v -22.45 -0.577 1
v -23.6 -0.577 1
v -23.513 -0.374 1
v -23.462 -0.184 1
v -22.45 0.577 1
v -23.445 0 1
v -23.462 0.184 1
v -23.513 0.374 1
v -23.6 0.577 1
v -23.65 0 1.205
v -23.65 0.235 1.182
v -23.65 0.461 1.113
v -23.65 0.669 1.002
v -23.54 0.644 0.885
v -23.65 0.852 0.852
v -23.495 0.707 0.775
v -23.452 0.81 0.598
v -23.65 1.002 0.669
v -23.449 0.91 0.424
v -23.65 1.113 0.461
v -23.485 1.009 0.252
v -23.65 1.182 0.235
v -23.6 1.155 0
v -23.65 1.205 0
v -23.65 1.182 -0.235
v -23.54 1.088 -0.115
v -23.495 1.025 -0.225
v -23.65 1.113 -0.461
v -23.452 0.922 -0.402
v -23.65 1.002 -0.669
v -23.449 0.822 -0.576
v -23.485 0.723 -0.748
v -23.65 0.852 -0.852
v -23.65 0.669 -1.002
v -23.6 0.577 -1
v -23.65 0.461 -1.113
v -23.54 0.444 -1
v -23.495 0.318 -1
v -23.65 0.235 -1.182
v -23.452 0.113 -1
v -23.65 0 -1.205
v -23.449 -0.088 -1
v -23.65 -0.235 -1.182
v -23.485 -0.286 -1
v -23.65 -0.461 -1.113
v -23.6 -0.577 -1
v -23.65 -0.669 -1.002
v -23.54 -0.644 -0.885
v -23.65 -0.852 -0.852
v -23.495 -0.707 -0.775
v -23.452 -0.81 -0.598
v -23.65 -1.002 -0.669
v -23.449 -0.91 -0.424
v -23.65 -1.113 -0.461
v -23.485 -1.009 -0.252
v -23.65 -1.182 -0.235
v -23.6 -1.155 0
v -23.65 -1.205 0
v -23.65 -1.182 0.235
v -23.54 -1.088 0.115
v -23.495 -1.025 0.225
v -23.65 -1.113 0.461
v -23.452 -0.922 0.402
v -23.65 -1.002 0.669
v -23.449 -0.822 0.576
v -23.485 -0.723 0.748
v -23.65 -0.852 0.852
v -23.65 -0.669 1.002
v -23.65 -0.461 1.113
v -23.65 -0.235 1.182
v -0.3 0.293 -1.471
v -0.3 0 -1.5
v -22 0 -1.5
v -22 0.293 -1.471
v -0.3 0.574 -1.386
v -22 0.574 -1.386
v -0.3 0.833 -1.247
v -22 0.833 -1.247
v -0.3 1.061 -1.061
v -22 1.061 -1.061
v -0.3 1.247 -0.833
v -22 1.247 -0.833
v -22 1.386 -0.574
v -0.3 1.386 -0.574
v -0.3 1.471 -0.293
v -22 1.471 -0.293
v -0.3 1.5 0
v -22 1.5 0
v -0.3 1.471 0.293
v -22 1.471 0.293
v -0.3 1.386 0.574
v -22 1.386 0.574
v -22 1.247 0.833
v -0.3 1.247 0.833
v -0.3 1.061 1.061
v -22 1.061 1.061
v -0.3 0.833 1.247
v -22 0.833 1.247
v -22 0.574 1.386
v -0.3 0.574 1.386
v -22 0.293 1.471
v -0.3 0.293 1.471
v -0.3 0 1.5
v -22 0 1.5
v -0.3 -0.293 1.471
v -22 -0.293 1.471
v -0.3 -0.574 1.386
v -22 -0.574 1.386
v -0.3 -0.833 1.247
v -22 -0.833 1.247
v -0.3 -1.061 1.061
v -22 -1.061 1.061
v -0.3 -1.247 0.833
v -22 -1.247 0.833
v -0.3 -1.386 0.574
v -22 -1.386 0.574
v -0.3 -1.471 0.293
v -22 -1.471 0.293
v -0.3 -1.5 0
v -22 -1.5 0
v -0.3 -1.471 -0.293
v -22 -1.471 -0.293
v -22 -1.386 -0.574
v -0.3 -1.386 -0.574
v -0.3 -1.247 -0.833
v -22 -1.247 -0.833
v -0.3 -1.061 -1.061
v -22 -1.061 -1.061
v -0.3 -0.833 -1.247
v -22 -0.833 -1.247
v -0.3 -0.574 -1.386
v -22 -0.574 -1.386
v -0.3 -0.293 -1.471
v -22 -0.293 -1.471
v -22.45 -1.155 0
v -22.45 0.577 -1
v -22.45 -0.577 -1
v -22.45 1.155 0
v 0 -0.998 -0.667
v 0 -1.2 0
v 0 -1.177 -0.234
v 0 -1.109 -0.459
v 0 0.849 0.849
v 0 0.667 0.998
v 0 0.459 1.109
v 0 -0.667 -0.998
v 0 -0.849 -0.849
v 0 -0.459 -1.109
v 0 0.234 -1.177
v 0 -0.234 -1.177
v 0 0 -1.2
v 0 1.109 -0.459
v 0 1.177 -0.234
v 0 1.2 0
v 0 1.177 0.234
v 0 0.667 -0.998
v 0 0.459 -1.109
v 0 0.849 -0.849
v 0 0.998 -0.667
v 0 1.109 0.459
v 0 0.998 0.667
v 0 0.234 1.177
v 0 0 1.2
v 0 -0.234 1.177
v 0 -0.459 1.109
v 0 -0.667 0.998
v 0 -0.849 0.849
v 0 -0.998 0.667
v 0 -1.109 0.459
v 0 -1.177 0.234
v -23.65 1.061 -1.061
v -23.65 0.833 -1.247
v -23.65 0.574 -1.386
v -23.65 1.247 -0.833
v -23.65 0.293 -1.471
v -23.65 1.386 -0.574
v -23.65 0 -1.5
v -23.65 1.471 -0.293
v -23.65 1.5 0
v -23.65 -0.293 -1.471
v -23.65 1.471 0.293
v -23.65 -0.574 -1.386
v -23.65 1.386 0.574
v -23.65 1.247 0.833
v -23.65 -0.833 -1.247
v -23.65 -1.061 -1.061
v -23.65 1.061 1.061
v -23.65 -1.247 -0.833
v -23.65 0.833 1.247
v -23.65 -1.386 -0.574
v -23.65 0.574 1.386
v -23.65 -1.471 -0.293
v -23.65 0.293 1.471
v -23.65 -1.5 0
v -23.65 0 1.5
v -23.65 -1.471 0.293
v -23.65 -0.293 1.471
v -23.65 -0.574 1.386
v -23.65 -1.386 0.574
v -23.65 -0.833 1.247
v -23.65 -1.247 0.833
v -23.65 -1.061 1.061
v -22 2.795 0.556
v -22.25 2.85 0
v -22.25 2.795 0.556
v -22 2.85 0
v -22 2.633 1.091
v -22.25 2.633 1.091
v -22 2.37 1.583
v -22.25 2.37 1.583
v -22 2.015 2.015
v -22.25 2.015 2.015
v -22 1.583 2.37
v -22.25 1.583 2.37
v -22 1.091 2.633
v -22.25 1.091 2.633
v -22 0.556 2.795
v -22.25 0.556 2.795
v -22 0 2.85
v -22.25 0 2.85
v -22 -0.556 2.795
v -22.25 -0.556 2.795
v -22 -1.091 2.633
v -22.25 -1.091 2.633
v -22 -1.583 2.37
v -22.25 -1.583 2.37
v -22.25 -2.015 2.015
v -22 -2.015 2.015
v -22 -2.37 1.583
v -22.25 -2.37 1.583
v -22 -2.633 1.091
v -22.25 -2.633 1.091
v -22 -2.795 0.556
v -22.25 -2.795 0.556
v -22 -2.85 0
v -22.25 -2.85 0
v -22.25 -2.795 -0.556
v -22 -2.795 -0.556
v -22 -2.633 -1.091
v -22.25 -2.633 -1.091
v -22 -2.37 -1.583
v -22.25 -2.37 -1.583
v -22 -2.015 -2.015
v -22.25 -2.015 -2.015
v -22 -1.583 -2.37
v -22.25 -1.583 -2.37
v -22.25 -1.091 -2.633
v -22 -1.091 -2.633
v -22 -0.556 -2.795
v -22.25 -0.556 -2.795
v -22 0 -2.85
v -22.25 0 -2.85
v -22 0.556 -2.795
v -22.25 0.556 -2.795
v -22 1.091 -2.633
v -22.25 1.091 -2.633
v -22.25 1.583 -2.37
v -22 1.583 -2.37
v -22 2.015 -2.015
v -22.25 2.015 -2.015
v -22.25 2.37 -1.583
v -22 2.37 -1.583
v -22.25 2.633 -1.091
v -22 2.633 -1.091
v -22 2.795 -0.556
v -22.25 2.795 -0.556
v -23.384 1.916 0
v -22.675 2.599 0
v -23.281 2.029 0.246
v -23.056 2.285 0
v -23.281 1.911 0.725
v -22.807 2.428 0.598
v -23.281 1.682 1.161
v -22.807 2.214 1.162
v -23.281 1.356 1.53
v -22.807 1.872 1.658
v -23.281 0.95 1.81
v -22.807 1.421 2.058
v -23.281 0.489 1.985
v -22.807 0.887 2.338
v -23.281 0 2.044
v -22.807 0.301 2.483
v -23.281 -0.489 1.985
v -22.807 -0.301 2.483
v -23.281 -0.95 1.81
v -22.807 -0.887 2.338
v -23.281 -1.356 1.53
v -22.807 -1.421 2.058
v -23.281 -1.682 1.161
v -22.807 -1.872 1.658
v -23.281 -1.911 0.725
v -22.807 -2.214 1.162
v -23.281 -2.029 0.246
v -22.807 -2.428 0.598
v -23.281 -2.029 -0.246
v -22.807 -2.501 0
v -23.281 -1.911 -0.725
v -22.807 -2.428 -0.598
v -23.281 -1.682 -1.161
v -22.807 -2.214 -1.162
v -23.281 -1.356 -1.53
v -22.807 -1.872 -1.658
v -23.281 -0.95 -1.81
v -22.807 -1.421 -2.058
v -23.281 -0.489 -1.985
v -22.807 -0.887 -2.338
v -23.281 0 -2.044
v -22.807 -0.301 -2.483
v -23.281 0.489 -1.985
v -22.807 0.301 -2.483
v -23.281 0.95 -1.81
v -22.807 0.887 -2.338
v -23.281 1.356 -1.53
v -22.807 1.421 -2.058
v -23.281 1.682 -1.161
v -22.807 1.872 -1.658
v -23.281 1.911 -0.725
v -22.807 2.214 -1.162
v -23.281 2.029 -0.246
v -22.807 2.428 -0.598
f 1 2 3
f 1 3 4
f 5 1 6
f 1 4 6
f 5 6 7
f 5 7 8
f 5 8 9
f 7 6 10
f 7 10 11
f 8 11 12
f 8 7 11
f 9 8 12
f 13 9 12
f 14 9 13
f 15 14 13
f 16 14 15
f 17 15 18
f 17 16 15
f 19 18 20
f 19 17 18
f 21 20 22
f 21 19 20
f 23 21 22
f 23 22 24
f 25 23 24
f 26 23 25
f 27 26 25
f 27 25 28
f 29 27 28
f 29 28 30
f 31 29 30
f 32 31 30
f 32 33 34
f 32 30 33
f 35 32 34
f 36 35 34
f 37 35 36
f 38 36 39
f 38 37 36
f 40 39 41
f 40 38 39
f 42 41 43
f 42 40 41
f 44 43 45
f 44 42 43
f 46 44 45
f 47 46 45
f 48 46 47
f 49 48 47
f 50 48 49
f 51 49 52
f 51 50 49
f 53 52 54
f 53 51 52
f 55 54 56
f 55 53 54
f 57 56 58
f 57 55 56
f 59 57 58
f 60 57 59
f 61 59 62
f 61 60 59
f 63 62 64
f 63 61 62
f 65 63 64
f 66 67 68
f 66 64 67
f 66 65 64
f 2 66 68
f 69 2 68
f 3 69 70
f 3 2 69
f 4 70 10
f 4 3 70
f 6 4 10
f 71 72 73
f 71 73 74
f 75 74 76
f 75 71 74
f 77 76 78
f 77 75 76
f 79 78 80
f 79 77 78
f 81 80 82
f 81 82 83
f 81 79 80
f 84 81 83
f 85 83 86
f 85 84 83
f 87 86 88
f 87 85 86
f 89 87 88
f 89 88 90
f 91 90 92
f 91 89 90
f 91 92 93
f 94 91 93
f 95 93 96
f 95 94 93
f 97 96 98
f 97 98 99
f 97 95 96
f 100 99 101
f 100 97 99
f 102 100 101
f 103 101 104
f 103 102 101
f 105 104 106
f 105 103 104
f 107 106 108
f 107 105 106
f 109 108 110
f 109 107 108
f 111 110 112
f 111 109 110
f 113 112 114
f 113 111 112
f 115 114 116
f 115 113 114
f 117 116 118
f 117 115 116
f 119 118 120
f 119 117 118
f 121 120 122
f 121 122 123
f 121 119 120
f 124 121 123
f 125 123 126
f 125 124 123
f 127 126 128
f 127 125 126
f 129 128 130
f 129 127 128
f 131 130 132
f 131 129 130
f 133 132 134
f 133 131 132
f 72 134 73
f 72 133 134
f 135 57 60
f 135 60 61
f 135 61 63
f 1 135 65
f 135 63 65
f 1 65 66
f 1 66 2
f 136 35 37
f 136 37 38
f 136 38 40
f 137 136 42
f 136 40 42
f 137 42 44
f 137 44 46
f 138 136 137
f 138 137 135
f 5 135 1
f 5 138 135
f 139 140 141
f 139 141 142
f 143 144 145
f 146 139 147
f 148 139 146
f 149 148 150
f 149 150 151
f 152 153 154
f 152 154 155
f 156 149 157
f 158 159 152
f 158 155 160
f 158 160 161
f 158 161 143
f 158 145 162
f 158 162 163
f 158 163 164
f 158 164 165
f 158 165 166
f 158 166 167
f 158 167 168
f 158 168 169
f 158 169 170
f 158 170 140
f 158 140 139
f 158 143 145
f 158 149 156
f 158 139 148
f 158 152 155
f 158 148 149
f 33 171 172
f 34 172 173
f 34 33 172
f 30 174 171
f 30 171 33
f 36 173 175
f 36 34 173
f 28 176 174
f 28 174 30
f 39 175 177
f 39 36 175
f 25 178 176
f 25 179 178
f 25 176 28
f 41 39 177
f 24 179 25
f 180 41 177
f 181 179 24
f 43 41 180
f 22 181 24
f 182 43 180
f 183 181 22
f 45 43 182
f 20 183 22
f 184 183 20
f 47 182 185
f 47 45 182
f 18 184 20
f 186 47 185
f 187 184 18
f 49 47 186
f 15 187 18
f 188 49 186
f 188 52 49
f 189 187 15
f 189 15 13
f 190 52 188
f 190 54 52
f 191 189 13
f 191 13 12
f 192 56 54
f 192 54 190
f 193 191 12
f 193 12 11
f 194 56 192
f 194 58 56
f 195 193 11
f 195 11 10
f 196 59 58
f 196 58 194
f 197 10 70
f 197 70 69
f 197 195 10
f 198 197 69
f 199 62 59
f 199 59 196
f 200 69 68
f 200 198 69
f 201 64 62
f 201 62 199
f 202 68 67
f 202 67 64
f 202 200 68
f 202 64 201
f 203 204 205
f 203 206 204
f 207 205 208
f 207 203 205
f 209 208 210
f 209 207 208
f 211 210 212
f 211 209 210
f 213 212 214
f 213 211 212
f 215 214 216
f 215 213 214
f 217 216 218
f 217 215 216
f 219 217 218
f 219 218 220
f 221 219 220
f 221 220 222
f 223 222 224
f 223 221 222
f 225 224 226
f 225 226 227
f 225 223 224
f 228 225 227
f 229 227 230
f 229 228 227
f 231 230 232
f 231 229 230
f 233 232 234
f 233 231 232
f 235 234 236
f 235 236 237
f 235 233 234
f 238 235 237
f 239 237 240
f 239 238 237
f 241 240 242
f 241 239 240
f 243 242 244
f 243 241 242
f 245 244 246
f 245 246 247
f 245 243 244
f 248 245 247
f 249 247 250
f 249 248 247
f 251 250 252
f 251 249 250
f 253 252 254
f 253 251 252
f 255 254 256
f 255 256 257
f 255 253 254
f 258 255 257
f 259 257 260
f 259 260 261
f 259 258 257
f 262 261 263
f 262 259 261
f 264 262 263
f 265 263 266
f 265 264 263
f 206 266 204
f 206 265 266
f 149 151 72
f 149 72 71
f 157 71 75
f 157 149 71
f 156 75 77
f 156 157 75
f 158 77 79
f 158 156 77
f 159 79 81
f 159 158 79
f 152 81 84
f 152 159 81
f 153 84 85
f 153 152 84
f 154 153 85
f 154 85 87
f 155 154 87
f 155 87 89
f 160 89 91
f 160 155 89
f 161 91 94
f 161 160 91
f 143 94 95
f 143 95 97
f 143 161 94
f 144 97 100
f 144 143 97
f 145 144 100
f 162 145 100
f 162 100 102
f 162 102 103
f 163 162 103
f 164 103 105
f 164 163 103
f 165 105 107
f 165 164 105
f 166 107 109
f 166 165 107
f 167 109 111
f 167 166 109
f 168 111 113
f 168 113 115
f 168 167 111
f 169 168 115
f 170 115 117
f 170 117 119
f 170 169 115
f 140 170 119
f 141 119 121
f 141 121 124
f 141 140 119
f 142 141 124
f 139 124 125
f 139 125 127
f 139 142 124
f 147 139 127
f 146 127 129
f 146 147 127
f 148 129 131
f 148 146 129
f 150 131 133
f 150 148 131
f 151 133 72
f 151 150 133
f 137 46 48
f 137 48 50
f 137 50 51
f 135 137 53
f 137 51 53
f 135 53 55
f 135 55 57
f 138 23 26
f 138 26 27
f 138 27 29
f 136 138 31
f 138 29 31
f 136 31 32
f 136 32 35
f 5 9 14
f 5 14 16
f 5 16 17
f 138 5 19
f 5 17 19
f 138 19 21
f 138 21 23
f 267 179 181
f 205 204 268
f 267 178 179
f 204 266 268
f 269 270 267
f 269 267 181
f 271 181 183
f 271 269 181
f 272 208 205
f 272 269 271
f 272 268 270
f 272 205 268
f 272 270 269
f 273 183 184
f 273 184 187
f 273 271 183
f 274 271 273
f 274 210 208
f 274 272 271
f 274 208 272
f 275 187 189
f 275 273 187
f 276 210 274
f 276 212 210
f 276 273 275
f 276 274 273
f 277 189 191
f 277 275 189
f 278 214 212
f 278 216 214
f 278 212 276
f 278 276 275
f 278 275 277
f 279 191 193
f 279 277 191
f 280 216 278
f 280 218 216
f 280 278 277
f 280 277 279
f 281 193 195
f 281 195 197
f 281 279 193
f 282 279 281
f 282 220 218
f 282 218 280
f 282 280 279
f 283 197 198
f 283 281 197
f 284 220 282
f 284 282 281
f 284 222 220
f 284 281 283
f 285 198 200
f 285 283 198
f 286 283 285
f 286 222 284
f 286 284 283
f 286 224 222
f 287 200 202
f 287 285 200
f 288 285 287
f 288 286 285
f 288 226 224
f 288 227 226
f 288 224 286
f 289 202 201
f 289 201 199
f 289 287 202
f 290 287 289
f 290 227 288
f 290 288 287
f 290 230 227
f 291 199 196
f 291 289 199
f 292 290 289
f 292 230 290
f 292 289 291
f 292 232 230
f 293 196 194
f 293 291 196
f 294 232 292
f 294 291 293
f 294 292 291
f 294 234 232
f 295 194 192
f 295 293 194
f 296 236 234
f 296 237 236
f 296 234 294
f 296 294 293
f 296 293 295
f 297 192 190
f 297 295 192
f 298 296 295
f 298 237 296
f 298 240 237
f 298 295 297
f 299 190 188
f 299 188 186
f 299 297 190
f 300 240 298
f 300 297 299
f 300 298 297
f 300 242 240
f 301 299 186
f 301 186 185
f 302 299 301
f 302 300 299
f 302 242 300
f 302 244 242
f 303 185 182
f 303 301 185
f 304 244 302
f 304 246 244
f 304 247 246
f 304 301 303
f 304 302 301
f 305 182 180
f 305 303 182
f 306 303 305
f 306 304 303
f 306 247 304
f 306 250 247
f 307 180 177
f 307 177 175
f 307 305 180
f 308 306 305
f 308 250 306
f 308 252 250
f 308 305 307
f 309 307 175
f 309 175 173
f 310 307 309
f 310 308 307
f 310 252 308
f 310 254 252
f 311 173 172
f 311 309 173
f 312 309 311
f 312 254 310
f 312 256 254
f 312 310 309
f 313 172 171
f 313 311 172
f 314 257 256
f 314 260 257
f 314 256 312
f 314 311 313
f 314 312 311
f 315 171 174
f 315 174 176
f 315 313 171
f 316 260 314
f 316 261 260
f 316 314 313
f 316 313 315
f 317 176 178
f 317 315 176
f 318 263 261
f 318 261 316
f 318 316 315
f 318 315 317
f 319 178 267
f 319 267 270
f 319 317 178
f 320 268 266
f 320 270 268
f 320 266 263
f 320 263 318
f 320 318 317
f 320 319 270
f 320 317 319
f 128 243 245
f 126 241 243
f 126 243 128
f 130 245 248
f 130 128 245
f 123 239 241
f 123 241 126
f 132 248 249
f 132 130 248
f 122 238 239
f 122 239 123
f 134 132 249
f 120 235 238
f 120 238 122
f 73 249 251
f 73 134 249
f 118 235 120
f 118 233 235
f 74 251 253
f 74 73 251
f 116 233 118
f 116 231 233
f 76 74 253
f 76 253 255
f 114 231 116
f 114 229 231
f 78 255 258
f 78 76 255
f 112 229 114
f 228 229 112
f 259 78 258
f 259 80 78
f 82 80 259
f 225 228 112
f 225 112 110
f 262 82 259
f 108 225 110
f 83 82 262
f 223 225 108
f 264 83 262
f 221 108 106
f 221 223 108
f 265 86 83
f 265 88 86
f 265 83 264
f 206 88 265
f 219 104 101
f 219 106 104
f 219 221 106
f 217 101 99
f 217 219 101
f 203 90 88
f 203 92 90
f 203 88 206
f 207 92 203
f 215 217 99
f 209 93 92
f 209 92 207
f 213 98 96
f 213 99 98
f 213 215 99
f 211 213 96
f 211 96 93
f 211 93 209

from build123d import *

# Parameters (mm, degrees)
SKETCH2_R           = 1.5
BOSS_EXTRUDE1_DEPTH = 22
CHAMFER1_SIZE       = 0.3
CUT_EXTRUDE1_DEPTH  = 1.2
SKETCH8_R           = 1.204700538
CUT_EXTRUDE2_DEPTH  = 1
CUT_EXTRUDE2_TAPER  = 45


with BuildPart() as part:
    # Sketch2 → Boss-Extrude1 (new body)
    with BuildSketch(Plane(origin=(0, 0, 0), x_dir=(0, 0, -1), z_dir=(1, 0, 0))):
        Circle(SKETCH2_R)
    extrude(amount=-BOSS_EXTRUDE1_DEPTH)

    # Chamfer1
    chamfer1_edges = [part.edges().sort_by_distance(p)[0] for p in [
        (0, 0, 1.5),
    ]]
    chamfer(chamfer1_edges, length=CHAMFER1_SIZE)

    # Sketch6 → Revolve1 (revolve)
    with BuildSketch(Plane.XY):
        with BuildLine():
            Line((-23.65, 0), (-23.65, 1.5))
            ThreePointArc((-23.65, 1.5), (-23.055944823, 2.284868705), (-22.25, 2.85))
            Line((-22.25, 2.85), (-22, 2.85))
            Line((-22, 2.85), (-22, 0))
            Line((-22, 0), (-23.65, 0))
        make_face()
    revolve(axis=Axis((-22, 0, 0), (1, 0, 0)))

    # Sketch7 → Cut-Extrude1 (cut)
    with BuildSketch(Plane.ZY.offset(23.65)):
        Polygon((0, 1.154700538), (-1, 0.577350269), (-1, -0.577350269), (0, -1.154700538), (1, -0.577350269), (1, 0.577350269), align=None)
    extrude(amount=-CUT_EXTRUDE1_DEPTH, mode=Mode.SUBTRACT)

    # Sketch8 → Cut-Extrude2 (cut)
    with BuildSketch(Plane.ZY.offset(23.65)):
        Circle(SKETCH8_R)
    extrude(amount=-CUT_EXTRUDE2_DEPTH, taper=CUT_EXTRUDE2_TAPER, mode=Mode.SUBTRACT)


solid = part.part
